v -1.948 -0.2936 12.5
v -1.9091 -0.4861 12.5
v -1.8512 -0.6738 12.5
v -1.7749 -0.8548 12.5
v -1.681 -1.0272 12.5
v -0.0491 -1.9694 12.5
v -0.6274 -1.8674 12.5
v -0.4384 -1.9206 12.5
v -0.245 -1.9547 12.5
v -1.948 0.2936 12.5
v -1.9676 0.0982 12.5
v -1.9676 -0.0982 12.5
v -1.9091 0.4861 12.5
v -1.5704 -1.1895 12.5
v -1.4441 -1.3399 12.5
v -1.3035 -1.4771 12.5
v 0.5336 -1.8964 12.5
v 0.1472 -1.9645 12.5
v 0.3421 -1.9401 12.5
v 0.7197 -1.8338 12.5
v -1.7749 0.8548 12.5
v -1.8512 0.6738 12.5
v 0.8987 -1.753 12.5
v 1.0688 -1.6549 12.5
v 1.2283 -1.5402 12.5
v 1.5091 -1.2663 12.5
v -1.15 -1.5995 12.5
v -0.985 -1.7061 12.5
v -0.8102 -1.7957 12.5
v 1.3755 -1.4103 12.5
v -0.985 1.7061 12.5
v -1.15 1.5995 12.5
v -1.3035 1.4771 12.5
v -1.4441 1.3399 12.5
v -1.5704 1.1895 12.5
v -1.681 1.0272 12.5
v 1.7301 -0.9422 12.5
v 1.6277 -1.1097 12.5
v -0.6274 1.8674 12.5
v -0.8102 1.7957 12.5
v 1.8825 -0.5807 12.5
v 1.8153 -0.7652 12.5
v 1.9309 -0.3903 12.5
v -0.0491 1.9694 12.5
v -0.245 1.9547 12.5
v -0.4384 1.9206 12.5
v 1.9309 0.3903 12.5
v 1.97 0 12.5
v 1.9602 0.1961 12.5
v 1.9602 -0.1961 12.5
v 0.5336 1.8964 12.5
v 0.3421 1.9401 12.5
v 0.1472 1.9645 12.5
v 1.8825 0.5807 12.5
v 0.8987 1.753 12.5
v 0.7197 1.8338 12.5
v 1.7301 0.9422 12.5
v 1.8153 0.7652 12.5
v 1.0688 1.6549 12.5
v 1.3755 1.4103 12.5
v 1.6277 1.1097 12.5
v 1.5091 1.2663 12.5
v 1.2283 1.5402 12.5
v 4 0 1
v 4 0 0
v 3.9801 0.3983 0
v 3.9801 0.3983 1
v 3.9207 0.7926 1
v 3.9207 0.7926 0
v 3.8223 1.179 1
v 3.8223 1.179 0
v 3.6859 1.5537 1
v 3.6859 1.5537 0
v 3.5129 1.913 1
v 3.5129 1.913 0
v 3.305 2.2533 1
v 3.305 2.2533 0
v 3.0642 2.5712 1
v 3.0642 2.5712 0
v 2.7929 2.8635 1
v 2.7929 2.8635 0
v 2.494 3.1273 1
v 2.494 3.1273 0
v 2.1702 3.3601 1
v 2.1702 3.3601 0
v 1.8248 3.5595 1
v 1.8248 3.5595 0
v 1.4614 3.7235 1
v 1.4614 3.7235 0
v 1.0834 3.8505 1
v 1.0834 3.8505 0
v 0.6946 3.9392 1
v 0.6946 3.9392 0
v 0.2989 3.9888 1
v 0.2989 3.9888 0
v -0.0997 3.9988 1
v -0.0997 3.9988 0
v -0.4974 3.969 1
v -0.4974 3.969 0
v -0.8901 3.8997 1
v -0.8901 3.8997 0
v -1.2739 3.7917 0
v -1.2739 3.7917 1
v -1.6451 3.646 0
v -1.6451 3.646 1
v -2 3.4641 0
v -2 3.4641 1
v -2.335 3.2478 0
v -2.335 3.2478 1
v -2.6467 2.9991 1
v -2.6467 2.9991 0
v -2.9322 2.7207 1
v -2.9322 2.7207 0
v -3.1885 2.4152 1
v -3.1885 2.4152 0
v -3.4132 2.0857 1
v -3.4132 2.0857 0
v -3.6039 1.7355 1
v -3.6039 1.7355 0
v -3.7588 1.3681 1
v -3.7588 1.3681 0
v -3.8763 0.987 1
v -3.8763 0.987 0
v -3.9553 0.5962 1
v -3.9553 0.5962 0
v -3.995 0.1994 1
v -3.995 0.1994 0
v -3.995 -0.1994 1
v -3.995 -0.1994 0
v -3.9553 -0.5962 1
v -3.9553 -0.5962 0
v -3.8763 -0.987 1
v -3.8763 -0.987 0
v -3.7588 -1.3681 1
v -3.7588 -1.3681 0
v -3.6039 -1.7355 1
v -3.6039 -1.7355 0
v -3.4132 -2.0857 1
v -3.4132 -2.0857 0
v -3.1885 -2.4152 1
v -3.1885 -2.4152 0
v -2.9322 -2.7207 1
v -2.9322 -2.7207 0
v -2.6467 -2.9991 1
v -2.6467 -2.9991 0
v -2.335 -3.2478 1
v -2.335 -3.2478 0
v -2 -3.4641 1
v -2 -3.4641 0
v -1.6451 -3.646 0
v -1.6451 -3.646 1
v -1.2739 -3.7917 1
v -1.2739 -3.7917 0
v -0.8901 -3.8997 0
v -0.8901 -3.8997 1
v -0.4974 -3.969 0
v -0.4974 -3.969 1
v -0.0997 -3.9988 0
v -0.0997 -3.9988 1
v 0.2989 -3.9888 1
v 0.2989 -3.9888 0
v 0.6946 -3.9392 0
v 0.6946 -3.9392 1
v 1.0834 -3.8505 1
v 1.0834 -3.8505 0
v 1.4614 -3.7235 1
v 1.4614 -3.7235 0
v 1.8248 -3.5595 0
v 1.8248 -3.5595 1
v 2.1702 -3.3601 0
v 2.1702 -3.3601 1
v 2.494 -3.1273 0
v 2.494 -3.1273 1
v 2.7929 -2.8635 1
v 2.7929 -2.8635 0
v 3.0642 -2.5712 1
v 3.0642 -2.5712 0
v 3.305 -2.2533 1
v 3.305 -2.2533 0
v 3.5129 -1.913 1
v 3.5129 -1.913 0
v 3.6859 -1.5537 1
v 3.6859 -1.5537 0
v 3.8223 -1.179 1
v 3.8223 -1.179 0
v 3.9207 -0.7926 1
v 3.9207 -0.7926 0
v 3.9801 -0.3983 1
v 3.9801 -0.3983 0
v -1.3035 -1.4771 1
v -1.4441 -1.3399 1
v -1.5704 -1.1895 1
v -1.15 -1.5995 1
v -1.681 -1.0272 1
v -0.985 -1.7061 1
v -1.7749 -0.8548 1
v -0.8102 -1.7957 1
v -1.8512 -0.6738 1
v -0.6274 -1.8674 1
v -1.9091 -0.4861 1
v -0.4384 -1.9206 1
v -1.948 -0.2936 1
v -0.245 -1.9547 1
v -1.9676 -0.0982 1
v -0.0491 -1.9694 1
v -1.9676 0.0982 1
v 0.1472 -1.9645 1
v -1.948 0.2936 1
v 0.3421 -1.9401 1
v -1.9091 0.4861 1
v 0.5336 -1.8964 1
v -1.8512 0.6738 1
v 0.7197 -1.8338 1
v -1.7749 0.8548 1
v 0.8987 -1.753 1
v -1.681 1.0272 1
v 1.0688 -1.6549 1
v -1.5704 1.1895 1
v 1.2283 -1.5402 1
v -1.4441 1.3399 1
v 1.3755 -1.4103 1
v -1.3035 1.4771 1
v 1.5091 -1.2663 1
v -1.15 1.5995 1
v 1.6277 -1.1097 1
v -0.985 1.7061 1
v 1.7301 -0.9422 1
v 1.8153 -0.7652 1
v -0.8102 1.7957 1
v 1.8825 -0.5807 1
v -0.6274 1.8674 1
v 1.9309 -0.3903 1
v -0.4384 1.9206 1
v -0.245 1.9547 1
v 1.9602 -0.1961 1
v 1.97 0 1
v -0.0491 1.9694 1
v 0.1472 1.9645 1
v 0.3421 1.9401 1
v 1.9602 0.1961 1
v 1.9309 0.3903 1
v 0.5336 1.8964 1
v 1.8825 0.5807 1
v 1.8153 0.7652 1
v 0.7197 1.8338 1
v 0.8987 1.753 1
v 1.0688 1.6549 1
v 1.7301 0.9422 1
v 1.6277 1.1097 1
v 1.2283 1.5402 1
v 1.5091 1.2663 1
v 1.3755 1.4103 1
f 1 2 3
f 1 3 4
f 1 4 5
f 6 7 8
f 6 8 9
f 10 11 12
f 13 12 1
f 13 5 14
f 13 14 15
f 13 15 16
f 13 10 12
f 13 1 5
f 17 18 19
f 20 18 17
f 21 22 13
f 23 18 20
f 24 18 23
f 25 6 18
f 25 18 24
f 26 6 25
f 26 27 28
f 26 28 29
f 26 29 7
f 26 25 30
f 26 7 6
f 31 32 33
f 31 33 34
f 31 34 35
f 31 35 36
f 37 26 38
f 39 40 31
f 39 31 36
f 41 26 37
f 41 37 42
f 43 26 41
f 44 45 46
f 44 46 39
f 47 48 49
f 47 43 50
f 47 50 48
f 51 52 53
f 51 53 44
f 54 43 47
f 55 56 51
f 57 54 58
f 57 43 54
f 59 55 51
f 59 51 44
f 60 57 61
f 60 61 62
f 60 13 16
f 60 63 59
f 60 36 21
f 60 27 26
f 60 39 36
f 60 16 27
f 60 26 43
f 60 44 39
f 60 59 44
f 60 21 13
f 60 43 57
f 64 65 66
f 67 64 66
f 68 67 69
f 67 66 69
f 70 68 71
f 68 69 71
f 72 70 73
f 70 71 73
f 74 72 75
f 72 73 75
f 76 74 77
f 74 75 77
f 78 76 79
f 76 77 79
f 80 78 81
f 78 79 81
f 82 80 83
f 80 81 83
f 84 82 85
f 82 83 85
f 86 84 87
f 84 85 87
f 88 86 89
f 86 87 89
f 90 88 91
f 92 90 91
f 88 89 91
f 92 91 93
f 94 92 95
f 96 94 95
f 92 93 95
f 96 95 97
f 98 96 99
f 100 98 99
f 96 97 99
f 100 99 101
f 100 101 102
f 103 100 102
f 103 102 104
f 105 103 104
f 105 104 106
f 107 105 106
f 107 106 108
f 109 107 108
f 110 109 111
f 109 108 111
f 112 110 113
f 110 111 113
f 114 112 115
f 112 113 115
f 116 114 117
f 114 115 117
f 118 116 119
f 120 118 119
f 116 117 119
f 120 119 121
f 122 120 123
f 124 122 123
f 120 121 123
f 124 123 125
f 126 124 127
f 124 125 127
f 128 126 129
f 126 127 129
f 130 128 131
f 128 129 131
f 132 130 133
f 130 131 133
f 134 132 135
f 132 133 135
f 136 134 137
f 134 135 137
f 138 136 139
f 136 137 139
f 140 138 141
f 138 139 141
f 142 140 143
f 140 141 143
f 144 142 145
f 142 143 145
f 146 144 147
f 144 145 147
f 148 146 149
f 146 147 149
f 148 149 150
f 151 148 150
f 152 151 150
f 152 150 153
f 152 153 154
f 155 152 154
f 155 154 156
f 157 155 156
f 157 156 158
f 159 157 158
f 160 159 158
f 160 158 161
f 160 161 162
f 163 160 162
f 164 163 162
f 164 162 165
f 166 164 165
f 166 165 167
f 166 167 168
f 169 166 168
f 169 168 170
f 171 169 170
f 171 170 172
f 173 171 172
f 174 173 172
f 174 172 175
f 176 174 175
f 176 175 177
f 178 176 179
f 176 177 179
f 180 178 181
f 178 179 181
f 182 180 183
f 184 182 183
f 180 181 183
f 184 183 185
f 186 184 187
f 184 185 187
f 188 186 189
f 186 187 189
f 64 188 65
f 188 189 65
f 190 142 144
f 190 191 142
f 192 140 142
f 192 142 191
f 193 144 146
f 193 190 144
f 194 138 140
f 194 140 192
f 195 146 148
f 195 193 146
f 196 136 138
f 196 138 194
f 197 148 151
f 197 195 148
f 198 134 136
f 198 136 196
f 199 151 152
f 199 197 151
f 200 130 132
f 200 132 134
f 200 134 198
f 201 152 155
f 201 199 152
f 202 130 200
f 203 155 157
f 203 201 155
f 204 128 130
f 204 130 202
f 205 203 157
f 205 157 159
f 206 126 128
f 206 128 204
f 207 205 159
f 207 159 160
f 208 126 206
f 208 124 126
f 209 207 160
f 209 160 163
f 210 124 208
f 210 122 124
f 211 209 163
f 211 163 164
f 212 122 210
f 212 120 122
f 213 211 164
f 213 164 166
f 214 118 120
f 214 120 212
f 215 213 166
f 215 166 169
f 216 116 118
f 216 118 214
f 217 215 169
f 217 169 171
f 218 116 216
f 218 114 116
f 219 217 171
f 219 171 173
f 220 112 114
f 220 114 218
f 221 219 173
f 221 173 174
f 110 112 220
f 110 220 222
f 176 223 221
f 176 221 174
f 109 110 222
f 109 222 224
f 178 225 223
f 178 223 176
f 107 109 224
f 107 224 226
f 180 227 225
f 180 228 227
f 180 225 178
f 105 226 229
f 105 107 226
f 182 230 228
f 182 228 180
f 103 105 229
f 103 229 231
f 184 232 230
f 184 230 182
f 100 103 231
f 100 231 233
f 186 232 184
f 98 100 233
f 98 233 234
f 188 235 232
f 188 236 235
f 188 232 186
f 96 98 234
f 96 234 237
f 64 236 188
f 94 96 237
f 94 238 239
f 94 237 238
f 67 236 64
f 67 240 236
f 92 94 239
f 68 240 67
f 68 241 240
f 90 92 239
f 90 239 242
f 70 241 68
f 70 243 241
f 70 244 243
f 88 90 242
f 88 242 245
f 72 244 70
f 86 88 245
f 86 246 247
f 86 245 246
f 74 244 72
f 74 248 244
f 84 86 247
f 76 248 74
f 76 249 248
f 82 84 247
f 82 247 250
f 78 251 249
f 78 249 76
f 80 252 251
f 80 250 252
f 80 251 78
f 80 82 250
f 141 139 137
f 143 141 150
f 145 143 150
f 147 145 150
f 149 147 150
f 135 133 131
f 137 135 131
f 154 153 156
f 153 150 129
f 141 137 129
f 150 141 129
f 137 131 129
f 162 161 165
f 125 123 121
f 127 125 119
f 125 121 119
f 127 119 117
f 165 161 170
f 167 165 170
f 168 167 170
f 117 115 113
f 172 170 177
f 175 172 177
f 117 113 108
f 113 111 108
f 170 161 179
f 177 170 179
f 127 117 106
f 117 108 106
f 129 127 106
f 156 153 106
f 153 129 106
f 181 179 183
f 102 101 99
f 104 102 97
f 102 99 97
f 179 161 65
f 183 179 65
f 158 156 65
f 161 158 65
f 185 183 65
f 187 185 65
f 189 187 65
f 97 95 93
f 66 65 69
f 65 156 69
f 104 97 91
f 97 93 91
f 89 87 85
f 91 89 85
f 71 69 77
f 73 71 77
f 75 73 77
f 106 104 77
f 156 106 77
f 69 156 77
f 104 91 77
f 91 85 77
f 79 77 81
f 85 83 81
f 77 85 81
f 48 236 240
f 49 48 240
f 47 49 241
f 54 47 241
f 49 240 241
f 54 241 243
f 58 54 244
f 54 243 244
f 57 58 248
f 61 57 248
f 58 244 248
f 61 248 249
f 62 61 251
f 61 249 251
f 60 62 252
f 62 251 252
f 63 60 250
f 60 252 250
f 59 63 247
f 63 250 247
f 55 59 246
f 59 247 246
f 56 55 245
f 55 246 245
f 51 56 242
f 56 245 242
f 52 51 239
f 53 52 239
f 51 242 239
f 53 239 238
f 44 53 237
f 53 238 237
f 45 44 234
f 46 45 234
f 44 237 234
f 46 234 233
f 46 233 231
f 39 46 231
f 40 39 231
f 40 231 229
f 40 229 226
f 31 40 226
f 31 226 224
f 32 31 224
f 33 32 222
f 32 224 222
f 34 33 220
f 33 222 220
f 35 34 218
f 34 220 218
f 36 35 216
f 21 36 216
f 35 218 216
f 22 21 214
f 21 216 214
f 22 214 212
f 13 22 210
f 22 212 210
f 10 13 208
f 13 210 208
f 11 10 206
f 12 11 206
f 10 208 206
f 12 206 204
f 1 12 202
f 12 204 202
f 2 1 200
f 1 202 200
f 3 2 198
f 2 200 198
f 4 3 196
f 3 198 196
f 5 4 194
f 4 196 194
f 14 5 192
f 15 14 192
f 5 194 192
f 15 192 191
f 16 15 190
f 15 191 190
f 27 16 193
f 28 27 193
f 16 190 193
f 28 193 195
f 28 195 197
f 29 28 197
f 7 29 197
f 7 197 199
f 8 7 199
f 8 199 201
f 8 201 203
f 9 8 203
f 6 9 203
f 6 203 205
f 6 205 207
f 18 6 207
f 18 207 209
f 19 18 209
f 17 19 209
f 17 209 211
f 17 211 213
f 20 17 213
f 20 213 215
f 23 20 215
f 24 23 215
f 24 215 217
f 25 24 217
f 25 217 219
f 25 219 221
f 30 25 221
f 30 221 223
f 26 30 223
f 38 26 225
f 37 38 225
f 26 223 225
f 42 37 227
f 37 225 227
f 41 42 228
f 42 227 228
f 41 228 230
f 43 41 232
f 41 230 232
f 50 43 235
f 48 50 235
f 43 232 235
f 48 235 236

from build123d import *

# Parameters (mm, degrees)
CYLINDER001_R     = 1.97
CYLINDER001_DEPTH = 11.5
CYLINDER_R        = 4
CYLINDER_DEPTH    = 1


with BuildPart() as cylinder001:
    # Cylinder001 → Cylinder001 (new body)
    with BuildSketch(Plane.XY.offset(1)):
        Circle(CYLINDER001_R)
    extrude(amount=CYLINDER001_DEPTH)


with BuildPart() as fusion:
    # Cylinder → Cylinder (new body)
    with BuildSketch(Plane.XY):
        Circle(CYLINDER_R)
    extrude(amount=CYLINDER_DEPTH)

    # Fusion: union Cylinder001
    add(cylinder001.part)


solid = fusion.part
